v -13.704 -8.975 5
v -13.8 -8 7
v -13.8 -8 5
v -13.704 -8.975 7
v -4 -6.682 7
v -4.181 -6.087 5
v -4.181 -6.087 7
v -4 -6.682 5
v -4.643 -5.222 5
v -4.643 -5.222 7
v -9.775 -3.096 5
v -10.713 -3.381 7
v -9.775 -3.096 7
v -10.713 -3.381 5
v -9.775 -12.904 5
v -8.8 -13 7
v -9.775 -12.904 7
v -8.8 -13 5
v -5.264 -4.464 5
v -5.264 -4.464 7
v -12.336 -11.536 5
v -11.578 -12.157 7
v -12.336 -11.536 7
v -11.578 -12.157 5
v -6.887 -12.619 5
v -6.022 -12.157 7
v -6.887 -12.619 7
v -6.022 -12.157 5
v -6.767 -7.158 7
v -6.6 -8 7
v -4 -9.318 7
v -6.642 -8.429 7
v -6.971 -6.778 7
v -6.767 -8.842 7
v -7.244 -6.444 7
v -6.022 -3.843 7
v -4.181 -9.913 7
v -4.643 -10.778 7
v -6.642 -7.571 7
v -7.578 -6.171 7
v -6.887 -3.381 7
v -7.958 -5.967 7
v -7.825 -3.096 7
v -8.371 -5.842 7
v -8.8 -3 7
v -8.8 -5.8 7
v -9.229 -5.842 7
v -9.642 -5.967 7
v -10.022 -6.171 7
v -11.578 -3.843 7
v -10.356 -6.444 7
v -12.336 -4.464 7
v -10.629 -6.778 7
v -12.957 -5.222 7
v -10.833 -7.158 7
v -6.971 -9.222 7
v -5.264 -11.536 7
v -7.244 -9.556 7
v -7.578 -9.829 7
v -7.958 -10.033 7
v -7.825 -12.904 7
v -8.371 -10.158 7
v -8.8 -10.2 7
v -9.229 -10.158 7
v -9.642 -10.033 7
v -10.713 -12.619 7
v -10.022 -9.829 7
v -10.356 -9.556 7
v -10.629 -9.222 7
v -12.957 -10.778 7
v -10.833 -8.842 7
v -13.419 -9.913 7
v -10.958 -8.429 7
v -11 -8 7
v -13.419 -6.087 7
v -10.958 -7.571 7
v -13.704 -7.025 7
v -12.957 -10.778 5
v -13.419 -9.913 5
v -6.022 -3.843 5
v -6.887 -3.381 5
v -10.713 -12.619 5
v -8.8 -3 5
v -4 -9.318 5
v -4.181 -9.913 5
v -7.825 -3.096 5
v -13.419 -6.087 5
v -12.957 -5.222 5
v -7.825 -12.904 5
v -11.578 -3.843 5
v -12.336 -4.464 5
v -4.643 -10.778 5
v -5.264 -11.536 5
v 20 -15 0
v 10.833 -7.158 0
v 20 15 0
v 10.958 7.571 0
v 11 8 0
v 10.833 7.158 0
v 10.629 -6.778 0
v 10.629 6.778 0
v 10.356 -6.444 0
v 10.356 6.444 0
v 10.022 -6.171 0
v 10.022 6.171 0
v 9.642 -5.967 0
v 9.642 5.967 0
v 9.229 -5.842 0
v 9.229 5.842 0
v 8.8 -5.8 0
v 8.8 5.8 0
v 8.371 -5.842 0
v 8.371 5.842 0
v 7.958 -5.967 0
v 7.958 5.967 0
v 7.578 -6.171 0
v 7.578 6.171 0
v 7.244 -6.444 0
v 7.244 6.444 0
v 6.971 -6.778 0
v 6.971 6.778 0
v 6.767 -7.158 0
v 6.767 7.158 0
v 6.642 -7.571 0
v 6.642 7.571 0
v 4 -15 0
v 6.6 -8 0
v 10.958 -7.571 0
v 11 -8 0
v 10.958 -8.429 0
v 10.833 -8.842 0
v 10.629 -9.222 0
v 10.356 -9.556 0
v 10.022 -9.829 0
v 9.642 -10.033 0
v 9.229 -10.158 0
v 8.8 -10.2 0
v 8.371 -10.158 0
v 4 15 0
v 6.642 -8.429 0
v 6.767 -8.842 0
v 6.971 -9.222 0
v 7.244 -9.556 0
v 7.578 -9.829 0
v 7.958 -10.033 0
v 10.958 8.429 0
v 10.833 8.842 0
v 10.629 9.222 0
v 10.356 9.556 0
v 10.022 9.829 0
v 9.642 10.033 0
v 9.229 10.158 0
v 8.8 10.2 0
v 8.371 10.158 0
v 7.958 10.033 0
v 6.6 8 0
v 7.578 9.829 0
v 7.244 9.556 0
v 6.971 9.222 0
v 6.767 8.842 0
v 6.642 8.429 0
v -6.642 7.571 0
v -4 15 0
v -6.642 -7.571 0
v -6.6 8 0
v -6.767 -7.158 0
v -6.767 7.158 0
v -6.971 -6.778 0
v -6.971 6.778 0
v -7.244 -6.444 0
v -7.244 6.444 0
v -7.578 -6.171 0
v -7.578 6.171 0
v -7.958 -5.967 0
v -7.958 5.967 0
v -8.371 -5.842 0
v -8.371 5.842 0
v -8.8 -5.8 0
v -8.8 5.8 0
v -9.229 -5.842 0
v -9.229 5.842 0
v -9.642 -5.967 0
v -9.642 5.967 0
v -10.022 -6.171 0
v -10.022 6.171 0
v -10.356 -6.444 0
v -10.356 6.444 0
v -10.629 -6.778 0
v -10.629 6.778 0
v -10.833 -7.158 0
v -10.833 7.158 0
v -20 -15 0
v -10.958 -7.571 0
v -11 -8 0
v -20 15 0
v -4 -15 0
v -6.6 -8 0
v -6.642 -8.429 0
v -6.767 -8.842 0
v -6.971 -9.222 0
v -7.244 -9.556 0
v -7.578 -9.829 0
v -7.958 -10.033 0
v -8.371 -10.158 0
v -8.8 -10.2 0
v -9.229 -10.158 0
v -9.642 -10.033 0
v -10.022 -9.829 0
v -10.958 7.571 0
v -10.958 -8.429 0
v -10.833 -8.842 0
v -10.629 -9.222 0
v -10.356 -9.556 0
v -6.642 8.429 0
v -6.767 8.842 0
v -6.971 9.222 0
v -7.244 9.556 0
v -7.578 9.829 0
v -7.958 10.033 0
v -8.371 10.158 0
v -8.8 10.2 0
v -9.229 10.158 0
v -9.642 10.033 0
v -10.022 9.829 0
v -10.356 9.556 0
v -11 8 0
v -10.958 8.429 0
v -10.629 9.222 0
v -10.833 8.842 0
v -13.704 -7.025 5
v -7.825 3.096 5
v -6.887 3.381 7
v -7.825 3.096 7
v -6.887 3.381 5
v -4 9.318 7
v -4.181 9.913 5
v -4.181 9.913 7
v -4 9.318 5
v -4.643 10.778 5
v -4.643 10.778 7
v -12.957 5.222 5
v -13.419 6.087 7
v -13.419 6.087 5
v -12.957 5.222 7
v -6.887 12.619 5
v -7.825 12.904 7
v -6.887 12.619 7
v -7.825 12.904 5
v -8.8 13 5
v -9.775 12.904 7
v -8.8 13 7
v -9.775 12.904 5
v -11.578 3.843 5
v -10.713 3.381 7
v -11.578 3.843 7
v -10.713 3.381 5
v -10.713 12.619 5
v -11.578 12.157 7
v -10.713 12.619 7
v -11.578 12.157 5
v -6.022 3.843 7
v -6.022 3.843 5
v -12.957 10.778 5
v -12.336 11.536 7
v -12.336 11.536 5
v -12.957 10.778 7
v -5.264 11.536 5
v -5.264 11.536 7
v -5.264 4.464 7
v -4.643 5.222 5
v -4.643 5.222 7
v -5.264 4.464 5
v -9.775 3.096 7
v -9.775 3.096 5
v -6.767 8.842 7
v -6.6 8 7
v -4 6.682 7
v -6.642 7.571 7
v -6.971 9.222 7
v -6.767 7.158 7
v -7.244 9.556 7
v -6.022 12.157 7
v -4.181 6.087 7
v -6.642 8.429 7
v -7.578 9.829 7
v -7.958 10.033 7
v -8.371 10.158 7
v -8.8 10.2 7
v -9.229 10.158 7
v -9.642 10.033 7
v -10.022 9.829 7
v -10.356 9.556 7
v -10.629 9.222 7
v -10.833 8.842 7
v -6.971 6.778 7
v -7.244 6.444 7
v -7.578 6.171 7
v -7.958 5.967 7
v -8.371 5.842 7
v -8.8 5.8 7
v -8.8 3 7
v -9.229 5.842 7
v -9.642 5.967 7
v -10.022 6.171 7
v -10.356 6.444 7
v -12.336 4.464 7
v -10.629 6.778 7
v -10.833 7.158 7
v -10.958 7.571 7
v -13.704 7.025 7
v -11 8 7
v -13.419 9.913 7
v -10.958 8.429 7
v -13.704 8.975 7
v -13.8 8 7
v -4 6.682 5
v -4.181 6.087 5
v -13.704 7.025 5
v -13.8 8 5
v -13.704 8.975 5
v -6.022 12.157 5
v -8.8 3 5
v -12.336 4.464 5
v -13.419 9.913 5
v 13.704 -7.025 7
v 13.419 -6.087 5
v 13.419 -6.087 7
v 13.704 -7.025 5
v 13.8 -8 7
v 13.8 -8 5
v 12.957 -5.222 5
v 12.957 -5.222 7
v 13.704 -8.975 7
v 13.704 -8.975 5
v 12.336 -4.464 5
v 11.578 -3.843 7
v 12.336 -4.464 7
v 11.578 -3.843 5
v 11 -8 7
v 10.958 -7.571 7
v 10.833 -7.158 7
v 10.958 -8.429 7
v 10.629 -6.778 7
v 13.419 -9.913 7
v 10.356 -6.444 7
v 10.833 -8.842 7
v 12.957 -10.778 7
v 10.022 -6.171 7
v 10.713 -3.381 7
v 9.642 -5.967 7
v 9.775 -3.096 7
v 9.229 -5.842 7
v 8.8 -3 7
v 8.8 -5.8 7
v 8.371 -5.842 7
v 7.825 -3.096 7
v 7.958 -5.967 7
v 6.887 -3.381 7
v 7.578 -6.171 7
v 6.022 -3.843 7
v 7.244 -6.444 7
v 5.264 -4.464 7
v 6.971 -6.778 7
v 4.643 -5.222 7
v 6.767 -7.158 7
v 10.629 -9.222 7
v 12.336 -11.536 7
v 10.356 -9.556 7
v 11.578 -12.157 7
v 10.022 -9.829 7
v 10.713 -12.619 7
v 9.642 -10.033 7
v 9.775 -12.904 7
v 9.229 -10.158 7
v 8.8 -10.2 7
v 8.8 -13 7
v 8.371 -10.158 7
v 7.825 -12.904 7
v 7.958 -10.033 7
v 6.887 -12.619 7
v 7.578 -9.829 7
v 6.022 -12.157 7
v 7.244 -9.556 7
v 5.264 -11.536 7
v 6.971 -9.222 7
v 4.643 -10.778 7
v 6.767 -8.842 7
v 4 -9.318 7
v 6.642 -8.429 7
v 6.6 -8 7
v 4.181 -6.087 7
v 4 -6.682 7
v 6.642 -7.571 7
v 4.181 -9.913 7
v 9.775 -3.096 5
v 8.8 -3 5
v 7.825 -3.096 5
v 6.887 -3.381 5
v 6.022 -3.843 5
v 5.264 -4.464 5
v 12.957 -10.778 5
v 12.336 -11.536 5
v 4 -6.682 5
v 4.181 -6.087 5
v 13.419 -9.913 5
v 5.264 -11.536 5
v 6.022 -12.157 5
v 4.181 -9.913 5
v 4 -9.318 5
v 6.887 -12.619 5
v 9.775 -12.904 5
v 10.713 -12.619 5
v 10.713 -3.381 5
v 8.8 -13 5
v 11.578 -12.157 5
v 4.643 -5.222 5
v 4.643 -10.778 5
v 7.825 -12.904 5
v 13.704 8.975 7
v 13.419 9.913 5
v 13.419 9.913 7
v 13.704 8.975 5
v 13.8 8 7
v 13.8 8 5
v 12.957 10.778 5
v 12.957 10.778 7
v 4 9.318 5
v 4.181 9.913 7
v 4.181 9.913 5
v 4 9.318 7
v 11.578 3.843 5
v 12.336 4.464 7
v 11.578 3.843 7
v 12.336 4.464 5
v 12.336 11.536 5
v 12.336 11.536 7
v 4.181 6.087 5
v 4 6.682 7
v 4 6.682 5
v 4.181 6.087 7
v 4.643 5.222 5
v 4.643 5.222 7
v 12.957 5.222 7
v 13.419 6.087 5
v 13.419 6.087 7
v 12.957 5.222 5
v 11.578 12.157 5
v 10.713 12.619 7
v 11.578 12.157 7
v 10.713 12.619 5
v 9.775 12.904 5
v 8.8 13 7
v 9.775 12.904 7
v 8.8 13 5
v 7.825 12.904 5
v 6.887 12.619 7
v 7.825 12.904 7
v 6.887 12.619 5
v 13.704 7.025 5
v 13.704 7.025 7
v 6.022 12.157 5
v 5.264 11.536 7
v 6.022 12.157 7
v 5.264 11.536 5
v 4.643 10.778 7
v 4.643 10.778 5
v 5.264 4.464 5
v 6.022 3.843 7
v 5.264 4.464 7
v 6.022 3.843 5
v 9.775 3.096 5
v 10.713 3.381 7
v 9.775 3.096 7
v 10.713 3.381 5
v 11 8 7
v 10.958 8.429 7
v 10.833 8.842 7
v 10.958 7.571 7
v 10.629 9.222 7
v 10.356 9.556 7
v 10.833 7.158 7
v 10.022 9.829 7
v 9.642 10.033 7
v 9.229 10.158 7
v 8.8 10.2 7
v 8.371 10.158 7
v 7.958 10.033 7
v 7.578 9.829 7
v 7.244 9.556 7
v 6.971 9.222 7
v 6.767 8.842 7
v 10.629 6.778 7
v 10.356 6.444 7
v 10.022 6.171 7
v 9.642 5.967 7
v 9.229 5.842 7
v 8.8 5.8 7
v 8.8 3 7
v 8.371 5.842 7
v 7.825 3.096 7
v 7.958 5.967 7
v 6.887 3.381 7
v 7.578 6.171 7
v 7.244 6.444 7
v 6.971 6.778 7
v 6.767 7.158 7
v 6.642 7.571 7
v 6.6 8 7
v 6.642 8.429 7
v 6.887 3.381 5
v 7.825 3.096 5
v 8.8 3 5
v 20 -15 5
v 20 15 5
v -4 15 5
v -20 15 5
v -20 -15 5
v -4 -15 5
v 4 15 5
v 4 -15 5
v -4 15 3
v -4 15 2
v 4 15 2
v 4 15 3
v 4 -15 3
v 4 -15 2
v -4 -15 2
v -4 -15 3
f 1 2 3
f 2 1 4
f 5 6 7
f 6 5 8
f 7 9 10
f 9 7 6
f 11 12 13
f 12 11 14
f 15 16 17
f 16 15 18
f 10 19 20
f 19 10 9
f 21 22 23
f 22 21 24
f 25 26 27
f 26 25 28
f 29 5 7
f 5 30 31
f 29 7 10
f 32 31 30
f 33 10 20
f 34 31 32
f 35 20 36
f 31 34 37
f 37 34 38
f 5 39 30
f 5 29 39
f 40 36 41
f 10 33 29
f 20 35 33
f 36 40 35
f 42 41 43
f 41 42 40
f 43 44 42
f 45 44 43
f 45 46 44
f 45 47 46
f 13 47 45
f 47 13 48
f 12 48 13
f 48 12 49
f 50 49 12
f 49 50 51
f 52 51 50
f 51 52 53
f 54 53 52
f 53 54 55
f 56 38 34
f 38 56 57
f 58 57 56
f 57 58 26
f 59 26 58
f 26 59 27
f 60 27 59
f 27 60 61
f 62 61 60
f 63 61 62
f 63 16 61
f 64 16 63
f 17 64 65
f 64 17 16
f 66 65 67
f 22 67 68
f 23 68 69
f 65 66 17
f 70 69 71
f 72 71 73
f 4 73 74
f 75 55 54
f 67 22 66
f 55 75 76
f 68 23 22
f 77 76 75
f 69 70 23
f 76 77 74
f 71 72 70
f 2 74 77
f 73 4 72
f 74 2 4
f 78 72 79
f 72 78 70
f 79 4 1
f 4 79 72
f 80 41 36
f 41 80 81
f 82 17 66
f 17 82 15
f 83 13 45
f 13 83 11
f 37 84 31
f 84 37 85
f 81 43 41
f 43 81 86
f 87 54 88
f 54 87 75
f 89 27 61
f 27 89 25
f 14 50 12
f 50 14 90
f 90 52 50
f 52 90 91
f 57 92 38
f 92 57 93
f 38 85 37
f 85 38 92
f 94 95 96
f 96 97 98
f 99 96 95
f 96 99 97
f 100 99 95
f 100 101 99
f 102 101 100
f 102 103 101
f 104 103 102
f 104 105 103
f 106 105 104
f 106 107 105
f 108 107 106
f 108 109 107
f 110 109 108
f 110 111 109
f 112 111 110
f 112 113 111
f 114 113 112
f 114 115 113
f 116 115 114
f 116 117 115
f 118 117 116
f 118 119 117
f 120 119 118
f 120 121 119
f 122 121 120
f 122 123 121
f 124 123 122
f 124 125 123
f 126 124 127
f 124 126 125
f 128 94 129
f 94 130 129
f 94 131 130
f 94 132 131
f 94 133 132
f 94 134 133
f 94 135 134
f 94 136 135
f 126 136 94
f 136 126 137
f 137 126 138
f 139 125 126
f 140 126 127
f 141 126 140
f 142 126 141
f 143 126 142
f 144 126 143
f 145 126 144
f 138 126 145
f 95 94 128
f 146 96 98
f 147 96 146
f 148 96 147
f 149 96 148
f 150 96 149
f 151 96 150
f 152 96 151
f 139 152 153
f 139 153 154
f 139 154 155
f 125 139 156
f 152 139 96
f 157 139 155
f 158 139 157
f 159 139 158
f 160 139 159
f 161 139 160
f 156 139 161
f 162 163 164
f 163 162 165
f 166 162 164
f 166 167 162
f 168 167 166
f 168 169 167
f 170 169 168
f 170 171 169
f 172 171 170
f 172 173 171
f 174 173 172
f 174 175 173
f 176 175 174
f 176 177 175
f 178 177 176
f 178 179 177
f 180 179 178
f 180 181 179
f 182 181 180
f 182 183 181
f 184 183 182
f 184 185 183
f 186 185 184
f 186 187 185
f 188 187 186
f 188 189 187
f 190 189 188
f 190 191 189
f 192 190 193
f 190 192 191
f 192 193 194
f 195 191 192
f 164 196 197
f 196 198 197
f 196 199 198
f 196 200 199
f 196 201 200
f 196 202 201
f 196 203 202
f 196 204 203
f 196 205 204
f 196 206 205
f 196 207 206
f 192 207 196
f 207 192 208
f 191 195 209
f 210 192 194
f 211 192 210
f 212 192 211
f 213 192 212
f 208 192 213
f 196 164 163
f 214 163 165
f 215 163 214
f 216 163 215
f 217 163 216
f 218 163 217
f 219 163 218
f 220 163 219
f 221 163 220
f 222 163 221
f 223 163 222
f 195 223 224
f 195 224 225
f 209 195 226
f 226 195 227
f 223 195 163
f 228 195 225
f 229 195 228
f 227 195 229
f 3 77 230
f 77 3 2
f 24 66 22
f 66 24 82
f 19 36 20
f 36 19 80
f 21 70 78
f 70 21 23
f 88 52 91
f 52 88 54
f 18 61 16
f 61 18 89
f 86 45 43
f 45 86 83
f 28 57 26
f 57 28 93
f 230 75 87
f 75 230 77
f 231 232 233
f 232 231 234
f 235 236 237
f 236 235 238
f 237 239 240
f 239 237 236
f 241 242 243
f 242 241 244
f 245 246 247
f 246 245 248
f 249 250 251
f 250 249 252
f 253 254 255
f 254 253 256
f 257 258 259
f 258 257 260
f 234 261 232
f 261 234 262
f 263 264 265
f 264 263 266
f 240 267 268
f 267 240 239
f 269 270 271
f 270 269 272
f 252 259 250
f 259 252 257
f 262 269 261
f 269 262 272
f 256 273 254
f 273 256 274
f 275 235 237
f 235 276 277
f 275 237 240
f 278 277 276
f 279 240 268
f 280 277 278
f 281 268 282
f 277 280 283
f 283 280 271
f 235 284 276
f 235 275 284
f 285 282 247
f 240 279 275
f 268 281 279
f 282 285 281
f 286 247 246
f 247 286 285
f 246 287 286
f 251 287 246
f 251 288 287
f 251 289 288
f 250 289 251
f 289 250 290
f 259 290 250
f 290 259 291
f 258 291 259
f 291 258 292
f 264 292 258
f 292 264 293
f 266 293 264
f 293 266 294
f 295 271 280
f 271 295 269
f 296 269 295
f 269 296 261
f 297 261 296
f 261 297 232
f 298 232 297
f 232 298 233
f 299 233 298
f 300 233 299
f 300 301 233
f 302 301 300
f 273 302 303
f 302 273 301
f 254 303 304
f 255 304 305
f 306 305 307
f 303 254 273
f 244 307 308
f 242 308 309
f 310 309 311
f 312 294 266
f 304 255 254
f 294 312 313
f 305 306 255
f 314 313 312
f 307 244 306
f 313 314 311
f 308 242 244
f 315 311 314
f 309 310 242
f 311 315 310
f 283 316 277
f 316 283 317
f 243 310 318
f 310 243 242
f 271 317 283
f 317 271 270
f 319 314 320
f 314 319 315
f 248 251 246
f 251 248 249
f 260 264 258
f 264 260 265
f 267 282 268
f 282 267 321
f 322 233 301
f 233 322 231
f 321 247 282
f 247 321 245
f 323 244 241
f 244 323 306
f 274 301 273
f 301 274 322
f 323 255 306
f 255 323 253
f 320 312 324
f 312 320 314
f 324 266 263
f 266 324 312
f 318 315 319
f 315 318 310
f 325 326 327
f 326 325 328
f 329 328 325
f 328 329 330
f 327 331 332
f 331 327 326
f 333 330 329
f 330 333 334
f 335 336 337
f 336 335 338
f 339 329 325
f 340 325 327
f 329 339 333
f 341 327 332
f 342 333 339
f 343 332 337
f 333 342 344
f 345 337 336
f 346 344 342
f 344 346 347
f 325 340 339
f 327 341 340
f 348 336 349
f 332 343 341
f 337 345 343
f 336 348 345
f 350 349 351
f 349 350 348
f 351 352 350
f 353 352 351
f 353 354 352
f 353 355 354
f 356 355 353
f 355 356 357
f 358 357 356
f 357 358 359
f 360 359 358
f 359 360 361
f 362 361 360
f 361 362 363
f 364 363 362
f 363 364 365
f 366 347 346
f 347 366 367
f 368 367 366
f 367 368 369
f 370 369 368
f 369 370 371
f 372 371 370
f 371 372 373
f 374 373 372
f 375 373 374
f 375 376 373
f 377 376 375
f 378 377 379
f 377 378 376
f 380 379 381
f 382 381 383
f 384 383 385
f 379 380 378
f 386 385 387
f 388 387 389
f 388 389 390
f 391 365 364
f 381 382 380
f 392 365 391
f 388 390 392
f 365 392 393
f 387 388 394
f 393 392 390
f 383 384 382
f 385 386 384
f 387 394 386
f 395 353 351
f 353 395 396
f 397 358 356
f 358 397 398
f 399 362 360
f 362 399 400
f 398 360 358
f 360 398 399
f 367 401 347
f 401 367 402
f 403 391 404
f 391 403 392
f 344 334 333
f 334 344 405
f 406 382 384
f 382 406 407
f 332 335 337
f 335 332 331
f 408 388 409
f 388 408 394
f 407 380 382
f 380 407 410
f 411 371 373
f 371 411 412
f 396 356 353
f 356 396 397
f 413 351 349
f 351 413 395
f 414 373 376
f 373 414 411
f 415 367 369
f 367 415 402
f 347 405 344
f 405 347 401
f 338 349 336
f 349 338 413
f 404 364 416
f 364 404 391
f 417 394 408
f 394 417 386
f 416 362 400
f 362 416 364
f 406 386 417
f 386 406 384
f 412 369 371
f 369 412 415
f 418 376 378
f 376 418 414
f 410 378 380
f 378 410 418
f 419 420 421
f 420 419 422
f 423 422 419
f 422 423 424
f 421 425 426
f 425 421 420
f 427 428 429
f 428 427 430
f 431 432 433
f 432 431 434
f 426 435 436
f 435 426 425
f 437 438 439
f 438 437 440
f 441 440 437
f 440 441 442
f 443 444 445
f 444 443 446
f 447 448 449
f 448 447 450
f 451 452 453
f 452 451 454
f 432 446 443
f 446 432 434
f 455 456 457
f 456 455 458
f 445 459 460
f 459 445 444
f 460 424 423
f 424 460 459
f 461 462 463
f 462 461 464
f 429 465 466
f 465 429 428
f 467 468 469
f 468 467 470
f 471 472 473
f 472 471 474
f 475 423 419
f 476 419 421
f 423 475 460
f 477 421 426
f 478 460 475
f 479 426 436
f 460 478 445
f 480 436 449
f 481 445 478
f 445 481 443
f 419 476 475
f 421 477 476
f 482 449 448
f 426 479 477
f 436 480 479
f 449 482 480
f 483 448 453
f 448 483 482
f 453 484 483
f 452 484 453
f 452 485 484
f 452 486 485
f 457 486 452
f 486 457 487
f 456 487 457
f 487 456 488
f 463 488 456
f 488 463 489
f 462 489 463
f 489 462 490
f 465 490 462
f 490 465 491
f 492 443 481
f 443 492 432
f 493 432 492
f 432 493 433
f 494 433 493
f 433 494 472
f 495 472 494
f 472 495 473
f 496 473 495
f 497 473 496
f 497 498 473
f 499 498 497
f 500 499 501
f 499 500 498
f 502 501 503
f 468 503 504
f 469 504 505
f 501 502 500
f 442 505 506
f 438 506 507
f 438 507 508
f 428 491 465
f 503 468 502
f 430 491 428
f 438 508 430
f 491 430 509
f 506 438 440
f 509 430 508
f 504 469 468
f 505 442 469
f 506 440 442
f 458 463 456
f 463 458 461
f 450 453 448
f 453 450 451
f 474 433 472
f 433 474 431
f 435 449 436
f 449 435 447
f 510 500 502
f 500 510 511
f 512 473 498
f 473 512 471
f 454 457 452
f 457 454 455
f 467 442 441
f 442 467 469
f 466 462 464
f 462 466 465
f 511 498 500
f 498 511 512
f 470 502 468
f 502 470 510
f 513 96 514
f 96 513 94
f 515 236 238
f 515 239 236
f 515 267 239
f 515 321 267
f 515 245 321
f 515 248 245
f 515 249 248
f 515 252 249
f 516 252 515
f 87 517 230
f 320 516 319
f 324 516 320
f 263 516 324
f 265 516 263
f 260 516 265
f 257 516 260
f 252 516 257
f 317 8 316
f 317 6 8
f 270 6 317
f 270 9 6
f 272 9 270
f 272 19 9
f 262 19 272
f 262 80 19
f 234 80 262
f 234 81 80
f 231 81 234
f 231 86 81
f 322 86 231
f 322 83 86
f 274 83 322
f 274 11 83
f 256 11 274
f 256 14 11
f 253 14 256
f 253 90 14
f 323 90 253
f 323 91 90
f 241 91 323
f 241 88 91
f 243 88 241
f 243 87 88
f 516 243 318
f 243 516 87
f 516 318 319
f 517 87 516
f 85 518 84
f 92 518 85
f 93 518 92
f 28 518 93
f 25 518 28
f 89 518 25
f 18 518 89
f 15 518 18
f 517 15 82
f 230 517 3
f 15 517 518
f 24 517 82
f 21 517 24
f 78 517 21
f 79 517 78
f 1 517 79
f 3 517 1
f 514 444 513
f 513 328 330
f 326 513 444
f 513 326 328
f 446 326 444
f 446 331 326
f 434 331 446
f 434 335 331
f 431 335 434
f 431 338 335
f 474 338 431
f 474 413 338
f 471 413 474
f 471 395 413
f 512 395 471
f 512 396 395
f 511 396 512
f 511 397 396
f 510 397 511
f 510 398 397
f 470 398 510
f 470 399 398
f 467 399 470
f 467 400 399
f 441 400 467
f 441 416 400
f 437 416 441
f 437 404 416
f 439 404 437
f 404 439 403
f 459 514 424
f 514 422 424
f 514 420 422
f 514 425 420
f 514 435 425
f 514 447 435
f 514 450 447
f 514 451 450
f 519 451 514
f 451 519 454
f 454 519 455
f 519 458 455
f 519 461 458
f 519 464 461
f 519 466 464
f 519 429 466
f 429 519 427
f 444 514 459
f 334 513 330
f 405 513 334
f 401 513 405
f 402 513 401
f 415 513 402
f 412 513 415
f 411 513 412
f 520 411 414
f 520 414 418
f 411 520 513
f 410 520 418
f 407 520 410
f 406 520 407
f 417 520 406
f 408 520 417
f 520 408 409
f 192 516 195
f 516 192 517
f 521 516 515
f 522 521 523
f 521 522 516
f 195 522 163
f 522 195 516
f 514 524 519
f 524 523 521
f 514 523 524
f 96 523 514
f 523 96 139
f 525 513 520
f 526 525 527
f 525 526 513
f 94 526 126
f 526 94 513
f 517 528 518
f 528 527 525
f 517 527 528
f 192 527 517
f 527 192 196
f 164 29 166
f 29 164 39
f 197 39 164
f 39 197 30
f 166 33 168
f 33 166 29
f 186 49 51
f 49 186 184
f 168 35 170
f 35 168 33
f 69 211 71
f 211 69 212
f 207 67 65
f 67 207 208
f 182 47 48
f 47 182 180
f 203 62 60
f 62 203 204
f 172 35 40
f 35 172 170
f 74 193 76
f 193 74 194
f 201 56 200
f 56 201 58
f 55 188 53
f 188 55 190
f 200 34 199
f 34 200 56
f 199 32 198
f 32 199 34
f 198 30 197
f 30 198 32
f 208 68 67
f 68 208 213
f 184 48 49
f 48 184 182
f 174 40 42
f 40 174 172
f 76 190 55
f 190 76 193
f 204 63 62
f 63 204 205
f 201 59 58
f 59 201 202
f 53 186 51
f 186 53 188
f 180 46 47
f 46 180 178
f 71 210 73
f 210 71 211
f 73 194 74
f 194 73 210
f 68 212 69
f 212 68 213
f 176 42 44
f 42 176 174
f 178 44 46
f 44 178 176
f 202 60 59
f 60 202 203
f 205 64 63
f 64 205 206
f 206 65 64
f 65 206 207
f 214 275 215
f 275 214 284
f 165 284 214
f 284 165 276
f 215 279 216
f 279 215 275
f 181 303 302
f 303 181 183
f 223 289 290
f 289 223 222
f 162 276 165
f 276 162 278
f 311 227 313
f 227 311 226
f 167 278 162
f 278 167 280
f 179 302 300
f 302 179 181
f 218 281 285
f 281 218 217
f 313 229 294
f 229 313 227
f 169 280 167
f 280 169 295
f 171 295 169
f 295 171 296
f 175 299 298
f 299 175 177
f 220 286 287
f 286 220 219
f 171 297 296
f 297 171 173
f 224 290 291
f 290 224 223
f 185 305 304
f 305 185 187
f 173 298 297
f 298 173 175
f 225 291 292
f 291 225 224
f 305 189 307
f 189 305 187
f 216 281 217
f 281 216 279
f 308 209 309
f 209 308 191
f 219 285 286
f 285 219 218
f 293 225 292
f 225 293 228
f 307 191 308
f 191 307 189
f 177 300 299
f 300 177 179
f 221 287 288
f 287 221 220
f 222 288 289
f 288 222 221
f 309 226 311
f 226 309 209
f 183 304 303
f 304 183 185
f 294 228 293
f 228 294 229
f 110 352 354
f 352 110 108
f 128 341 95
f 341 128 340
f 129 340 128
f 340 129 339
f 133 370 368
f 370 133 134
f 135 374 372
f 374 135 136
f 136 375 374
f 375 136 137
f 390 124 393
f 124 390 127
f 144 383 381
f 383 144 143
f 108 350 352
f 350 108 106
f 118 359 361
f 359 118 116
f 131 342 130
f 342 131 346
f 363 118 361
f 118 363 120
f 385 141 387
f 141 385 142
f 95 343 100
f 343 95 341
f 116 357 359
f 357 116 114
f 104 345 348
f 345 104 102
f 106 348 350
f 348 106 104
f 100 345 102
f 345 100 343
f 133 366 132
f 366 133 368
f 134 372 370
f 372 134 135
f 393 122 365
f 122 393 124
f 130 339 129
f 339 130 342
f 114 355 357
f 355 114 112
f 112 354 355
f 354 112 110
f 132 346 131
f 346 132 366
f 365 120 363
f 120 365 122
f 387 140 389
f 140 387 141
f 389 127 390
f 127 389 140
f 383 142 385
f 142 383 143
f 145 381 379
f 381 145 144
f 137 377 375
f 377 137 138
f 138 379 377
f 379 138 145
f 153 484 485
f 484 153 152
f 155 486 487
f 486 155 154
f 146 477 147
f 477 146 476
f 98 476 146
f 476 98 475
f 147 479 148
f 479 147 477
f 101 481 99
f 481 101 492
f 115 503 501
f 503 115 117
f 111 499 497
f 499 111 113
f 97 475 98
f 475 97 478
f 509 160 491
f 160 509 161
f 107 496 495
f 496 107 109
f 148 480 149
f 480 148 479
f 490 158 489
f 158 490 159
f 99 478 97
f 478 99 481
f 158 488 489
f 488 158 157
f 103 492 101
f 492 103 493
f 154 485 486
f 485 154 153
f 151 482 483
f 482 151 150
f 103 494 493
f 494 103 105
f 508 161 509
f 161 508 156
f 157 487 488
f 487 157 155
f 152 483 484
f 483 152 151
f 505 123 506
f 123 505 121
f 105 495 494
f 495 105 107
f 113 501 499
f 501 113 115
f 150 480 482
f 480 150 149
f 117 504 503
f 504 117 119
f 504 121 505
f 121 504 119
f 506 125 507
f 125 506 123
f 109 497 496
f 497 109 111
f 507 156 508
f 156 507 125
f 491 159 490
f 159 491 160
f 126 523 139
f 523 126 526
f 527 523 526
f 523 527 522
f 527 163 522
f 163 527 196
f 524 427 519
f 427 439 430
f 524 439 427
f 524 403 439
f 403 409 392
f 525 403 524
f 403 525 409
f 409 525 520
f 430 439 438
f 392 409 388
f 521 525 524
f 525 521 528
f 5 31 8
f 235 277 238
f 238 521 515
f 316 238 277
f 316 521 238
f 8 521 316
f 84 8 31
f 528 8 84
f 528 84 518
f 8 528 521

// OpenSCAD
$fn = 32;

// ----------------------------------------------------------------------
// Living hinge: 40 x 30 mm plates, 1 mm flexible web
// ----------------------------------------------------------------------

// --- parameters (mm) ---
plate_len = 16;           // plate length outside the web
plate_w = 30;             // plate width
thick = 5;                // plate thickness
web_half = 4;             // half width of the flex band
web_t = 1;                // flexible web thickness
web_z = 2;                // web position inside the thickness
boss_d = 10;              // screw boss diameter
boss_h = 7;               // screw boss height
boss_x = 8.8;             // screw boss distance from the web
screw_d = 4.4;            // screw hole

difference() {
  union() {
    /* one flat strip, later thinned at the middle */
    translate([-20, -15, 0]) cube([40, 30, 5]);
    /* screw bosses, sunk 0.5 mm into the plates */
    for (sx = [-8.8, 8.8]) {
      for (sy = [-8, 8]) {
        translate([sx, sy, 0]) cylinder(h = boss_h, d = boss_d);
      }
    }
  }
  /* channel from below: leaves the web on top of it */
  translate([-4, -17.5, -2.5]) cube([8, 35, 4.5]);
  /* channel from above: thins the web down to web_t */
  translate([-4, -17.5, 3]) cube([8, 35, 4.5]);
  /* screw holes through the bosses */
  for (sx = [-8.8, 8.8]) {
    for (sy = [-8, 8]) {
      translate([sx, sy, -2.5]) cylinder(h = boss_h + 5, d = screw_d);
    }
  }
}
